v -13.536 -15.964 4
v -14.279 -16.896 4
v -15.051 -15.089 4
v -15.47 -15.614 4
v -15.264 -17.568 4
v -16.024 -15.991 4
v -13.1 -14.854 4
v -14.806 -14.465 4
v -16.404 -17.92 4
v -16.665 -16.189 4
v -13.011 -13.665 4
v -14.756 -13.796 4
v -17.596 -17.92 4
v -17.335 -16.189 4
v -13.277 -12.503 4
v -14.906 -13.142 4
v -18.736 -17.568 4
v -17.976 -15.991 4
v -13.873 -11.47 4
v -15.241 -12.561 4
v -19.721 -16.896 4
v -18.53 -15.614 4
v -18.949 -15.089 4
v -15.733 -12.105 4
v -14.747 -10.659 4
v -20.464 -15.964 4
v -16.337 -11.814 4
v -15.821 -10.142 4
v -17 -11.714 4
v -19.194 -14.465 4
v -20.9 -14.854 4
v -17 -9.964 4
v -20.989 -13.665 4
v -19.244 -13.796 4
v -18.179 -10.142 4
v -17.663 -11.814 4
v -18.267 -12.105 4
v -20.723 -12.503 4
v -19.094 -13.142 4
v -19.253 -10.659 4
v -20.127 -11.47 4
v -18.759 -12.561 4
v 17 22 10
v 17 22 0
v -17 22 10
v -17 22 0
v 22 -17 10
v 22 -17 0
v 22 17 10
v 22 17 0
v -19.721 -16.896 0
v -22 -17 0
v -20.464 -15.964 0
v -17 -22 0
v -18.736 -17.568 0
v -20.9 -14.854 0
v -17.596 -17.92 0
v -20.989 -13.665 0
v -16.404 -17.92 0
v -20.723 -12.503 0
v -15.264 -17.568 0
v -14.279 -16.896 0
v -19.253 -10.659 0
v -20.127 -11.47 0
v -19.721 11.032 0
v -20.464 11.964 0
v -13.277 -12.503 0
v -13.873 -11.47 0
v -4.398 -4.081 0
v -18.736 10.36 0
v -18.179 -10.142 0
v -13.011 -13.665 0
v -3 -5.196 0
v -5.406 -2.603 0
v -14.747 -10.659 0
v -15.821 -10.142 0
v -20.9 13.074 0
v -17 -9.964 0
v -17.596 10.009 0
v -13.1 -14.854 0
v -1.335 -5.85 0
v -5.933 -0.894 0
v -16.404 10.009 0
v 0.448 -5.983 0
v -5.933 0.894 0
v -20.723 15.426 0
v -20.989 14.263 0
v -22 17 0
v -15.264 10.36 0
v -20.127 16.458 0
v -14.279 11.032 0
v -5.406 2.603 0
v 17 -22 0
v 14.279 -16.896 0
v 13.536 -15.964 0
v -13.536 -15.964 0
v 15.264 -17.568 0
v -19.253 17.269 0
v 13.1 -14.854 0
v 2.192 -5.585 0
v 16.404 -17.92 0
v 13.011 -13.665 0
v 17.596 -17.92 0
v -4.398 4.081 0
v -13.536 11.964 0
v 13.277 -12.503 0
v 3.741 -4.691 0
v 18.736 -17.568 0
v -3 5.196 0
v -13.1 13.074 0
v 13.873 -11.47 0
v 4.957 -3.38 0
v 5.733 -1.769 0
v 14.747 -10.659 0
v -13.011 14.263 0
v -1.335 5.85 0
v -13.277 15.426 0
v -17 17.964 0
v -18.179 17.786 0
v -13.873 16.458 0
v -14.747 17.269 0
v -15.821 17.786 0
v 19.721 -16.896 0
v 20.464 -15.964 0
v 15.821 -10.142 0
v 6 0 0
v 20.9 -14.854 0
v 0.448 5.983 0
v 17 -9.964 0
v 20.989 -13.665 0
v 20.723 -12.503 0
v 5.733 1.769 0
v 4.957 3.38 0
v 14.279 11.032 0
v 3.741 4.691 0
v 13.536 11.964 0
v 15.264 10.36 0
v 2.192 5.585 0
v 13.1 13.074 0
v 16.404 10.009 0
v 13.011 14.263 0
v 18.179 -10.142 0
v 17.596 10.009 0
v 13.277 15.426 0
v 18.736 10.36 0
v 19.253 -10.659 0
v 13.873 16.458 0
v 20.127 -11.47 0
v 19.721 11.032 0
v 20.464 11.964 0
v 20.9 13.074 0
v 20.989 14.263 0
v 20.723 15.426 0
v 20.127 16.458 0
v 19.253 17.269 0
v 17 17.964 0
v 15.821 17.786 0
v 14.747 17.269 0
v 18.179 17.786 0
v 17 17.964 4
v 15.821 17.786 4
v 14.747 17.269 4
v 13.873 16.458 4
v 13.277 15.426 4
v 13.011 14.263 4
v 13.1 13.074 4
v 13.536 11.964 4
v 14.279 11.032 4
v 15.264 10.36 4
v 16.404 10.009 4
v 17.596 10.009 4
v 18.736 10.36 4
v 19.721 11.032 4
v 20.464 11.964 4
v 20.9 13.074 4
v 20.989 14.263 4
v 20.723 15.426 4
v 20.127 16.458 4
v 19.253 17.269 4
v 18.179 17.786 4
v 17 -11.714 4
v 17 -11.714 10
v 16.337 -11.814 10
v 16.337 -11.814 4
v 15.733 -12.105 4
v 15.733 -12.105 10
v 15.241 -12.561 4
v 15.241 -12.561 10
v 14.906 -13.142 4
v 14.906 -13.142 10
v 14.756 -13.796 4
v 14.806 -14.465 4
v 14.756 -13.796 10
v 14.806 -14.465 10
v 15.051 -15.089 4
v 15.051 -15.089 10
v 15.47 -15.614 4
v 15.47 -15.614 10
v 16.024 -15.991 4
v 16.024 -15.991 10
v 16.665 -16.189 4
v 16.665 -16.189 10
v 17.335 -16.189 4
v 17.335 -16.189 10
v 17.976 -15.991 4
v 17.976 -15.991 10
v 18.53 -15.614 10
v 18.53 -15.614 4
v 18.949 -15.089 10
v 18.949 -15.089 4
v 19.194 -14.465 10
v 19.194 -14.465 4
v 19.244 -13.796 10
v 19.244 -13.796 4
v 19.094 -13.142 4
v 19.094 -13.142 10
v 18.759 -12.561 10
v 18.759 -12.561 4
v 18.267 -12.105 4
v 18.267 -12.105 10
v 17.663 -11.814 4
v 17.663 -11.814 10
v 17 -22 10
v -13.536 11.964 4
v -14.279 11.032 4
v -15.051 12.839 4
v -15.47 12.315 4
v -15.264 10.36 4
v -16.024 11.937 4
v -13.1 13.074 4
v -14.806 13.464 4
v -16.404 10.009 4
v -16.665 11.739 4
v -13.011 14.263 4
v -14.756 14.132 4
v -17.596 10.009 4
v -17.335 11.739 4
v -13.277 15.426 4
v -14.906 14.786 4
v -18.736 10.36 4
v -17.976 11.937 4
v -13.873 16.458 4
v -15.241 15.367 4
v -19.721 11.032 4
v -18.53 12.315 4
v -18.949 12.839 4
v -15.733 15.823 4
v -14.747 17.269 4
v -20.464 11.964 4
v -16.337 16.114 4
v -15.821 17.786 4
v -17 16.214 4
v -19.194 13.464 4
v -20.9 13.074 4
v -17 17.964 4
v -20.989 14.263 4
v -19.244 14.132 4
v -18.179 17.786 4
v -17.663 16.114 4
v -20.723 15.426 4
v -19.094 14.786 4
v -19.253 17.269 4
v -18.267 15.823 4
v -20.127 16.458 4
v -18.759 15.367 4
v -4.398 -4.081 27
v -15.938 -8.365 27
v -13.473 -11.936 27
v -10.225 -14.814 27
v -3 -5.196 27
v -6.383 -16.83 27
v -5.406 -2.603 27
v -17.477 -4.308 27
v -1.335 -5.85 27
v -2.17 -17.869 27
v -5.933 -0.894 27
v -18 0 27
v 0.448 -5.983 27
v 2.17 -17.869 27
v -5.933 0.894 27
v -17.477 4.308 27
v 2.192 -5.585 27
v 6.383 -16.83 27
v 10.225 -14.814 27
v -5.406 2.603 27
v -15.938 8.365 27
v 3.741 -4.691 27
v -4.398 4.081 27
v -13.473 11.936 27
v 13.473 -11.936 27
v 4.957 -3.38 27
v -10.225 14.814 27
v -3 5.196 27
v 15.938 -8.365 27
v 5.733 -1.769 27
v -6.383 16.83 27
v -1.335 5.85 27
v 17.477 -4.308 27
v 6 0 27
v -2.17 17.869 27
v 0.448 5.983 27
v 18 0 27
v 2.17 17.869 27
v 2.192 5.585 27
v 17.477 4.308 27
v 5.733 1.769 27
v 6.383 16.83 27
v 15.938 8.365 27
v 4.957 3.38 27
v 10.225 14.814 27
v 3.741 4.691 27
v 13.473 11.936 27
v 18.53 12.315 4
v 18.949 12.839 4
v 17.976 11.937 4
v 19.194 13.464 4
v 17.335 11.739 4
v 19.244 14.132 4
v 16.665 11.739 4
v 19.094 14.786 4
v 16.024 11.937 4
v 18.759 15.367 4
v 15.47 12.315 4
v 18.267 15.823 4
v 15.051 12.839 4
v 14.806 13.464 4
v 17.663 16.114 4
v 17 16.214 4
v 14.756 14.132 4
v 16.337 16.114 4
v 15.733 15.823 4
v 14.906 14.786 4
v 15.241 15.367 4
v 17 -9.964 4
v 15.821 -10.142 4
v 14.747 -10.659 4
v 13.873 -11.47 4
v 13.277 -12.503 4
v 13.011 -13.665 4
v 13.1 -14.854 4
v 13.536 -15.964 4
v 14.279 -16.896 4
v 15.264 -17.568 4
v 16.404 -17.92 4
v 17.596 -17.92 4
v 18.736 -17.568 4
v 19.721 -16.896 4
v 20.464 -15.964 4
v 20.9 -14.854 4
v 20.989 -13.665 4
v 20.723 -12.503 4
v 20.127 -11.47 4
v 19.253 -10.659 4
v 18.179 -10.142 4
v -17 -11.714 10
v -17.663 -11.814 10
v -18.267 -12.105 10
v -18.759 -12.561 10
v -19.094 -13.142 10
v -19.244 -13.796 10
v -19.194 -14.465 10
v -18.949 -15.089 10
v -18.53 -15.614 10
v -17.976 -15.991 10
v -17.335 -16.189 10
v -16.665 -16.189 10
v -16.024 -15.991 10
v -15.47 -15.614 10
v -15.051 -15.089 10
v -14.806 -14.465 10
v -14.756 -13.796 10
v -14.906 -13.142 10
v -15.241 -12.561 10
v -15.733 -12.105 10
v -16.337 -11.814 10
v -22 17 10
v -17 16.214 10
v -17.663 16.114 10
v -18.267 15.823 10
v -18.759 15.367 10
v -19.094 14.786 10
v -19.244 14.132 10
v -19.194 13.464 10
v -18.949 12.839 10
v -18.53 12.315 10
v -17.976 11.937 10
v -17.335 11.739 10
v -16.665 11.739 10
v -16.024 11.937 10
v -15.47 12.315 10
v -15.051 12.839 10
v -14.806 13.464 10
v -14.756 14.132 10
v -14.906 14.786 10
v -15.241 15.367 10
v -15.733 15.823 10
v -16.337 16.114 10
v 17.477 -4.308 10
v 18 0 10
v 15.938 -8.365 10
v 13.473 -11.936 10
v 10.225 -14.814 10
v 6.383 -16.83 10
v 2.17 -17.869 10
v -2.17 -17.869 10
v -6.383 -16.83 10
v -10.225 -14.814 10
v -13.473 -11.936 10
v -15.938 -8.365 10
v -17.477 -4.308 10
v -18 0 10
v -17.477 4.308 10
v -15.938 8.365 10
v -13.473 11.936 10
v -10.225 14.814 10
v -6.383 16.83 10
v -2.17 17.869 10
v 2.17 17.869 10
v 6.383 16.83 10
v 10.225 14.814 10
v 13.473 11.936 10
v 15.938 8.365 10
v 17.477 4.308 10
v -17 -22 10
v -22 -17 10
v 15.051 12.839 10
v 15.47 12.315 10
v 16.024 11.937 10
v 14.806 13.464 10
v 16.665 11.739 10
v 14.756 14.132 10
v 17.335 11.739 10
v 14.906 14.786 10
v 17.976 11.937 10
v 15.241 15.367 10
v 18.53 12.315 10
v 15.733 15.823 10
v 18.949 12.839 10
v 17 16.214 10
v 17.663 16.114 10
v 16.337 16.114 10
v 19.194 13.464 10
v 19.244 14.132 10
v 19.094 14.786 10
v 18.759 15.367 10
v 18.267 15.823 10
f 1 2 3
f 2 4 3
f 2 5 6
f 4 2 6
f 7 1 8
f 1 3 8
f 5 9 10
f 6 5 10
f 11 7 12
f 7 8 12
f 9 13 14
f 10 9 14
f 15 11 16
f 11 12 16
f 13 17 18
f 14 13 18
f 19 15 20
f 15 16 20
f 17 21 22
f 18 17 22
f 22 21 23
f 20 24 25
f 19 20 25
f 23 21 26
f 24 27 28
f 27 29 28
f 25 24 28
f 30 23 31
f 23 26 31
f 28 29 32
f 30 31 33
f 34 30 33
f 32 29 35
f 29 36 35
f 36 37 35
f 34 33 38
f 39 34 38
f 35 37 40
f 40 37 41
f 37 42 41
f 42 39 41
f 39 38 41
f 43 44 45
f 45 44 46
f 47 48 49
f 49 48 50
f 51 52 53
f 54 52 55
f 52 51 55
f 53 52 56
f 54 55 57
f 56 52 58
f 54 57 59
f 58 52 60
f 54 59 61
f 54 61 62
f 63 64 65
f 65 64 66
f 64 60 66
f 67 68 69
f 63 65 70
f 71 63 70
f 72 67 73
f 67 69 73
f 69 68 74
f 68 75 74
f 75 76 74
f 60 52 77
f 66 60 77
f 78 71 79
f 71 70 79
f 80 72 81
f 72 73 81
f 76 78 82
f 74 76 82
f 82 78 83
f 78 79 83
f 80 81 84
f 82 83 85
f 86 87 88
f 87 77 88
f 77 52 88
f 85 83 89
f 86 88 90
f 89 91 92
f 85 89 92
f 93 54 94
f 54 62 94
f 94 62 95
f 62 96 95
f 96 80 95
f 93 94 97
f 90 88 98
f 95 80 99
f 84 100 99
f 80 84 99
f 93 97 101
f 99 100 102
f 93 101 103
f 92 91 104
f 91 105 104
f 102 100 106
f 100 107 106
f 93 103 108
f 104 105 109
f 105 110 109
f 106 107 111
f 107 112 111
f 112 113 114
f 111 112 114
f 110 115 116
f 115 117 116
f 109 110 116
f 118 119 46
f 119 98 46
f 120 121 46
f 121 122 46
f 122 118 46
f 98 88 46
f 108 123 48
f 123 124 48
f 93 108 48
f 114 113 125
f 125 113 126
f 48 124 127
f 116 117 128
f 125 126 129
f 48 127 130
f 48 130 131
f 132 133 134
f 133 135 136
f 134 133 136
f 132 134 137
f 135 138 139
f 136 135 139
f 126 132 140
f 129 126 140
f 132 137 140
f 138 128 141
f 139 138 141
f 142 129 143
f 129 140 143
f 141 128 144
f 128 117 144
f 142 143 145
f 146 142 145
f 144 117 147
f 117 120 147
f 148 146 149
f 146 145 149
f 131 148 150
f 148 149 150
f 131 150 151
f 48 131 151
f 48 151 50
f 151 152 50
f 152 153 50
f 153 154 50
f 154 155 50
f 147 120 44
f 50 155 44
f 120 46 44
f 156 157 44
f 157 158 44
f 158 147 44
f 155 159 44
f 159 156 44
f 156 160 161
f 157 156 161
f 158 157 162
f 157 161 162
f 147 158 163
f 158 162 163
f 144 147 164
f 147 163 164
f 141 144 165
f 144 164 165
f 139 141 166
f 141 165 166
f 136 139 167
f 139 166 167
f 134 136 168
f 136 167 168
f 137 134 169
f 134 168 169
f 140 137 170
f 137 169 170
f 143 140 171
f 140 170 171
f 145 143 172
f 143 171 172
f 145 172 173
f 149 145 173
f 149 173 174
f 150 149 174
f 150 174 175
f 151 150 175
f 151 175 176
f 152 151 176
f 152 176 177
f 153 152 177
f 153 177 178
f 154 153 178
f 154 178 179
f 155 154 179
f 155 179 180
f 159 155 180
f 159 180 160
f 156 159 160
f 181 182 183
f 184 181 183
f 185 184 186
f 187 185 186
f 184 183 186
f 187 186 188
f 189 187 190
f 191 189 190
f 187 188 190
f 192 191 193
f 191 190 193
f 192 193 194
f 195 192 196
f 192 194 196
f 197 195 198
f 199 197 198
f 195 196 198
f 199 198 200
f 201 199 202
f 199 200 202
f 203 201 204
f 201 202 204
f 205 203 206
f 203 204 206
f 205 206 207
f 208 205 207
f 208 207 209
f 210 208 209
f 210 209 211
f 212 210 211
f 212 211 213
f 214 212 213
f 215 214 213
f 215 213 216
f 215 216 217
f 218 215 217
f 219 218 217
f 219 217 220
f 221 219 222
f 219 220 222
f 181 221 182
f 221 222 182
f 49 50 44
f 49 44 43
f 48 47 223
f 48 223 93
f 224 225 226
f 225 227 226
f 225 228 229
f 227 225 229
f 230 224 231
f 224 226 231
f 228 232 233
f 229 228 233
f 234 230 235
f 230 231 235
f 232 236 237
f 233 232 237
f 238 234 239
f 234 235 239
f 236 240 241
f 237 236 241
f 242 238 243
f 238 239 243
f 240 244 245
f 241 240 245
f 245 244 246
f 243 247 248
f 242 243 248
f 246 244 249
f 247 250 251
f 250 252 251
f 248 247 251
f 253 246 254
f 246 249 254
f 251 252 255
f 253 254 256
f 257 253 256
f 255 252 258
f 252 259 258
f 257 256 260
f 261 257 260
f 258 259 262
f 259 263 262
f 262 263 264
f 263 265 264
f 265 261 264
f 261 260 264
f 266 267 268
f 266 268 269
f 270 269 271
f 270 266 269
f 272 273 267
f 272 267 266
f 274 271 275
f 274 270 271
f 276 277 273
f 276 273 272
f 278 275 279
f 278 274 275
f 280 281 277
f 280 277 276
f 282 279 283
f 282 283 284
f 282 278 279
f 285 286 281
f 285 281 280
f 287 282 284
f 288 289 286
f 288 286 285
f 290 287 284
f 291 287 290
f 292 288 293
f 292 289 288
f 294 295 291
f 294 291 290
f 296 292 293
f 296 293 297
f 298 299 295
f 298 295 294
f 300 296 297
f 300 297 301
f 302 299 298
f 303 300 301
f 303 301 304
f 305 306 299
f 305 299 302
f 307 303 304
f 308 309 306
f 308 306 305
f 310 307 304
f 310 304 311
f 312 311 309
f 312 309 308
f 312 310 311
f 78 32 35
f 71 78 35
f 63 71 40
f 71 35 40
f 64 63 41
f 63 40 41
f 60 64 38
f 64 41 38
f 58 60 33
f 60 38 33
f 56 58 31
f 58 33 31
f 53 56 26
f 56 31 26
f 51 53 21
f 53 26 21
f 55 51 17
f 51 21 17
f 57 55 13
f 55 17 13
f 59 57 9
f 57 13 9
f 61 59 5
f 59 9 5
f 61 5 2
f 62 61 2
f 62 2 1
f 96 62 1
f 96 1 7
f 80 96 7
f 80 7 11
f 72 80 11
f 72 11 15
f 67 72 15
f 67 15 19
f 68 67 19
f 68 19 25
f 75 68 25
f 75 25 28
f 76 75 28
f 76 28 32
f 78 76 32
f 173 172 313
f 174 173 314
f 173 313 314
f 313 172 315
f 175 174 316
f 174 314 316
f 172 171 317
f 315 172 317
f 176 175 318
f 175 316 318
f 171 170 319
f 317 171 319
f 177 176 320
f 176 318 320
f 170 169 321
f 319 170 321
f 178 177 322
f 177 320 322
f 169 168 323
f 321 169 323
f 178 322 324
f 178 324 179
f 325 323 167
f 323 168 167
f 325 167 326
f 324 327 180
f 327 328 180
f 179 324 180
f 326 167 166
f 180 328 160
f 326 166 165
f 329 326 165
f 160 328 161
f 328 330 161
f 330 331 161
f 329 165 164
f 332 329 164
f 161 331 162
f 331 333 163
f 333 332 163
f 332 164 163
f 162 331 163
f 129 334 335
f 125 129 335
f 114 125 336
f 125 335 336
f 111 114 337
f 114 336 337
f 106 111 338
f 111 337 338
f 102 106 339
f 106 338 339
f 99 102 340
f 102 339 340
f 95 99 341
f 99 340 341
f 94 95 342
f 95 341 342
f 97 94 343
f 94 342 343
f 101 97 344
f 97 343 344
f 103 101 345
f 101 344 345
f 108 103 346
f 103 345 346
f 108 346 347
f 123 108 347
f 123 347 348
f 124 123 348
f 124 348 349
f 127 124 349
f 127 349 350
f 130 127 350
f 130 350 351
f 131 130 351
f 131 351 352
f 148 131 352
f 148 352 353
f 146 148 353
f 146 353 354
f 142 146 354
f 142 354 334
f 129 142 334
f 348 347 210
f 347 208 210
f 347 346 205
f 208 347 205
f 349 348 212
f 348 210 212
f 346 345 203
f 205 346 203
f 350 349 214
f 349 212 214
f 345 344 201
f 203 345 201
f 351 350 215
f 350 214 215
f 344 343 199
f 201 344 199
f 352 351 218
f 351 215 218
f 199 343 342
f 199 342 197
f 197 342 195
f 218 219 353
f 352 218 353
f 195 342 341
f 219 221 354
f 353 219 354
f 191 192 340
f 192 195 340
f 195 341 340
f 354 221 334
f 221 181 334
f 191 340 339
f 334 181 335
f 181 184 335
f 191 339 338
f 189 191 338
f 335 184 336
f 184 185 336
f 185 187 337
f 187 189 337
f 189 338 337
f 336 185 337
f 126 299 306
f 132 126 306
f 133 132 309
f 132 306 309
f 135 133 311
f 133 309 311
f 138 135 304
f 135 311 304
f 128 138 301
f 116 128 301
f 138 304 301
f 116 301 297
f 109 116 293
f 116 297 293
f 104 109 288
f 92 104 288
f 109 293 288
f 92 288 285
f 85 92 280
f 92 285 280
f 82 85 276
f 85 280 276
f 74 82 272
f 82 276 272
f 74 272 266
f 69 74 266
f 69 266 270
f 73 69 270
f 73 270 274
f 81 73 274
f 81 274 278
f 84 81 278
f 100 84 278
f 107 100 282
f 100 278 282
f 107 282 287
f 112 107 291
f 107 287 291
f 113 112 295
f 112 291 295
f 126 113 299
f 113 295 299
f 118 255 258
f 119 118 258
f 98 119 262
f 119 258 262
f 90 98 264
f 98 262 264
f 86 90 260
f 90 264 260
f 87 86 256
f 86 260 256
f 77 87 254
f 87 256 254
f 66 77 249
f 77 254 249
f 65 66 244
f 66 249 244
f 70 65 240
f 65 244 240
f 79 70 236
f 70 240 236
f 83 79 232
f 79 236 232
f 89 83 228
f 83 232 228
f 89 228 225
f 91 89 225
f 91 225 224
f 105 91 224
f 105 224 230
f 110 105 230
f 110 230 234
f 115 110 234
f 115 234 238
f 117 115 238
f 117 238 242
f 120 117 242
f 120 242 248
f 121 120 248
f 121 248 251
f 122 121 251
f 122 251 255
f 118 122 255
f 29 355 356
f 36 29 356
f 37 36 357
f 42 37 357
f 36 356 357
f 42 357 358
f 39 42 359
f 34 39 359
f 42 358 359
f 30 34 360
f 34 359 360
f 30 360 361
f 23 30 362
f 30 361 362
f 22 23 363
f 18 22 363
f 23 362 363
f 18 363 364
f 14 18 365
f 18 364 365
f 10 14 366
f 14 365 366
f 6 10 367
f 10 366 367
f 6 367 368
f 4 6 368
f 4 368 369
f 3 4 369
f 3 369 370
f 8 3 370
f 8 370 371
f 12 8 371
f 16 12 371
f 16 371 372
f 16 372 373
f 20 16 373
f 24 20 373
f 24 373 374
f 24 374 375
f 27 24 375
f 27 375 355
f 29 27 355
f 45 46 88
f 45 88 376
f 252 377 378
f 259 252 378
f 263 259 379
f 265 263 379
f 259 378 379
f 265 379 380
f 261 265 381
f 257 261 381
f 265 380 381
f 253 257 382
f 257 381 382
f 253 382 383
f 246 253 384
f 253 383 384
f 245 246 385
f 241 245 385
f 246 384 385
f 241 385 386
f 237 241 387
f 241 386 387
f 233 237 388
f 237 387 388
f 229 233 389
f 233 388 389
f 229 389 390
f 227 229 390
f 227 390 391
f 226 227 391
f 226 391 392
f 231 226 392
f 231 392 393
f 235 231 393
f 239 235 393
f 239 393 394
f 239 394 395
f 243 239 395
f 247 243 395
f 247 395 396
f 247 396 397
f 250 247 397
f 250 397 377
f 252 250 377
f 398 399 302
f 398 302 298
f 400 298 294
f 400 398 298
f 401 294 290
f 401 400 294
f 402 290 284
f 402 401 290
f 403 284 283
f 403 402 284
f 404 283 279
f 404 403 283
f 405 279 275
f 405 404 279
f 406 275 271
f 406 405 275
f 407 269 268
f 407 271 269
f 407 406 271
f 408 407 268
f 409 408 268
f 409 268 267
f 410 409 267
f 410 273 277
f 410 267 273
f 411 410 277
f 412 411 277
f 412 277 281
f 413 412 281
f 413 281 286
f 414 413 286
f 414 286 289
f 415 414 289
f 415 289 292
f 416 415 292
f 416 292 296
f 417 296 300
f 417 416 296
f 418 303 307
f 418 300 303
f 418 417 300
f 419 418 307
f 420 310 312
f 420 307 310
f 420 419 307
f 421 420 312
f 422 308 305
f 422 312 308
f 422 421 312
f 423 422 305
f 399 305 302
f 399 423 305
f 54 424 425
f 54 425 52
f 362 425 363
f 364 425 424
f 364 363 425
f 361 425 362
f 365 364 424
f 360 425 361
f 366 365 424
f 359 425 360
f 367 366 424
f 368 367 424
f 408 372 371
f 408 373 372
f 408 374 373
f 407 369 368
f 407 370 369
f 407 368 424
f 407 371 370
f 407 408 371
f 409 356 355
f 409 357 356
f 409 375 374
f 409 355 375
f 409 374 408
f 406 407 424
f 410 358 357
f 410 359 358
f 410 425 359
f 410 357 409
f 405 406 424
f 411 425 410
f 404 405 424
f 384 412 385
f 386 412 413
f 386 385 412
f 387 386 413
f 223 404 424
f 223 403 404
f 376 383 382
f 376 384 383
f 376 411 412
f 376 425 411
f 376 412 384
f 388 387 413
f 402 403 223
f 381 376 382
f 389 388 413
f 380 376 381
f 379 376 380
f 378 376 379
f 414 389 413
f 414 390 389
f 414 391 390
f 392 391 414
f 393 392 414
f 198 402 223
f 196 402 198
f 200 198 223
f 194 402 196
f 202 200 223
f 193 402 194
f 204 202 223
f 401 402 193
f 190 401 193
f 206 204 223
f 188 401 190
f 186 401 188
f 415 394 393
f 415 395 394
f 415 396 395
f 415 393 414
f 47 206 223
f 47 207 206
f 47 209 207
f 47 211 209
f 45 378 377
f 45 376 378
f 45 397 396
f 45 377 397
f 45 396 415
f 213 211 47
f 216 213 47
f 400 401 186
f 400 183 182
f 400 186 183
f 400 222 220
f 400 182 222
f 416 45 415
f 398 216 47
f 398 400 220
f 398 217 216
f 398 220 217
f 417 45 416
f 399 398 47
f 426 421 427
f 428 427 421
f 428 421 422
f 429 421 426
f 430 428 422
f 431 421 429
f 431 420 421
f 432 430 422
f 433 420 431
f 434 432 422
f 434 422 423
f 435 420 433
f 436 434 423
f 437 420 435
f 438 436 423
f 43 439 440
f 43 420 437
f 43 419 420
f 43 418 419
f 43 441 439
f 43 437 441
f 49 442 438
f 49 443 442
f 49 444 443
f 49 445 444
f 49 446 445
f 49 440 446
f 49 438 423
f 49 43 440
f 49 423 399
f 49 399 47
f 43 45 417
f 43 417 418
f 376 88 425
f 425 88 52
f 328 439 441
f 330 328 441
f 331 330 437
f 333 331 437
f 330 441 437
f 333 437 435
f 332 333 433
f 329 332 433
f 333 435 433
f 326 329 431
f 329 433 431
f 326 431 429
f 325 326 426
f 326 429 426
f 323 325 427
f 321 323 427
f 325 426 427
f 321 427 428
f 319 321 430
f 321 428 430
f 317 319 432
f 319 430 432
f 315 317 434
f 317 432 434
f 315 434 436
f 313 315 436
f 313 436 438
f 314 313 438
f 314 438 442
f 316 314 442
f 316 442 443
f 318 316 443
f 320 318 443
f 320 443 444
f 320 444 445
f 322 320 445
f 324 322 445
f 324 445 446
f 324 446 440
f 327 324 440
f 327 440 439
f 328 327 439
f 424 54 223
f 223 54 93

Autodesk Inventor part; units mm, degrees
ref_plane "YZ Plane" through (0, 0, 0) normal (1, 0, 0) x (0, 1, 0)
ref_plane "XZ Plane" through (0, 0, 0) normal (0, 1, 0) x (-1, 0, 0)
ref_plane "XY Plane" through (0, 0, 0) normal (0, 0, 1) x (1, 0, 0)
sketch "Sketch1" plane through (0, 0, 0) normal (0, 0, 1) x (1, 0, 0)
  line L0 (-22, -22) -> (22, -22)
  line L1 (22, -22) -> (22, 22)
  line L2 (22, 22) -> (-22, 22)
  line L3 (-22, 22) -> (-22, -22)
  line L4 (-22, -22) -> (22, 22) construction
  line L5 (22, -22) -> (-22, 22) construction
  point P0 (0, 0)
  point P1 (0, 0)
  dimension "a" = 44
  dimension "d10" = 22
  dimension "d11" = 22
  dimension "d15" = 44
extrude "Extrusion1" add sketch "Sketch1" along normal blind 10
sketch "Sketch2" plane through (0, 0, 10) normal (0, 0, 1) x (1, 0, 0)
  circle A0 centre (0, 0) radius 18
  dimension "dg6" = 36
extrude "Extrusion2" add sketch "Sketch2" along normal blind 17
sketch "Sketch3" plane through (0, 0, 27) normal (0, 0, 1) x (1, 0, 0)
  circle A0 centre (0, 0) radius 18 projected
  circle A1 centre (0, 0) radius 6
  dimension "d1" = 12
extrude "Extrusion3" cut sketch "Sketch3" against normal through all contours A1
chamfer "Chamfer1" distance 5 angle 45 4 edges at (22, 22, 5) (22, -22, 5) (-22, -22, 5) (-22, 22, 5)
sketch "Sketch4" plane through (0, 0, 0) normal (0, 0, -1) x (-1, 0, 0)
  circle A0 centre (0, 0) radius 6 projected
  circle A1 centre (0, 0) radius 22 construction
  point P0 (17, 13.9642)
  point P1 (-17, -13.9642)
  point P2 (-17, 13.9642)
  point P3 (17, -13.9642)
  dimension "d16" = 44
  dimension "d17" = 34
hole "Hole1" at (-17, 13.9642, 0) at (17, -13.9642, 0) at (17, 13.9642, 0) at (-17, -13.9642, 0) direction (0, 0, 1) diameter 4.5 end through all
sketch "Sketch5" plane through (0, 0, 0) normal (0, 0, -1) x (-1, 0, 0)
  circle A0 centre (-17, 13.9642) radius 2.25 projected
  circle A1 centre (17, 13.9642) radius 2.25 projected
  circle A2 centre (-17, -13.9642) radius 2.25 projected
  circle A3 centre (17, -13.9642) radius 2.25 projected
hole "Hole2" at (17, 13.9642, 0) at (-17, 13.9642, 0) at (-17, -13.9642, 0) at (17, -13.9642, 0) direction (0, 0, 1) diameter 8 depth 4
equation "\"d10\" = 0.5 * a"
equation "\"d11\" = 0.5 * a"
equation "\"d15\" = a"
properties part number "fk12"
